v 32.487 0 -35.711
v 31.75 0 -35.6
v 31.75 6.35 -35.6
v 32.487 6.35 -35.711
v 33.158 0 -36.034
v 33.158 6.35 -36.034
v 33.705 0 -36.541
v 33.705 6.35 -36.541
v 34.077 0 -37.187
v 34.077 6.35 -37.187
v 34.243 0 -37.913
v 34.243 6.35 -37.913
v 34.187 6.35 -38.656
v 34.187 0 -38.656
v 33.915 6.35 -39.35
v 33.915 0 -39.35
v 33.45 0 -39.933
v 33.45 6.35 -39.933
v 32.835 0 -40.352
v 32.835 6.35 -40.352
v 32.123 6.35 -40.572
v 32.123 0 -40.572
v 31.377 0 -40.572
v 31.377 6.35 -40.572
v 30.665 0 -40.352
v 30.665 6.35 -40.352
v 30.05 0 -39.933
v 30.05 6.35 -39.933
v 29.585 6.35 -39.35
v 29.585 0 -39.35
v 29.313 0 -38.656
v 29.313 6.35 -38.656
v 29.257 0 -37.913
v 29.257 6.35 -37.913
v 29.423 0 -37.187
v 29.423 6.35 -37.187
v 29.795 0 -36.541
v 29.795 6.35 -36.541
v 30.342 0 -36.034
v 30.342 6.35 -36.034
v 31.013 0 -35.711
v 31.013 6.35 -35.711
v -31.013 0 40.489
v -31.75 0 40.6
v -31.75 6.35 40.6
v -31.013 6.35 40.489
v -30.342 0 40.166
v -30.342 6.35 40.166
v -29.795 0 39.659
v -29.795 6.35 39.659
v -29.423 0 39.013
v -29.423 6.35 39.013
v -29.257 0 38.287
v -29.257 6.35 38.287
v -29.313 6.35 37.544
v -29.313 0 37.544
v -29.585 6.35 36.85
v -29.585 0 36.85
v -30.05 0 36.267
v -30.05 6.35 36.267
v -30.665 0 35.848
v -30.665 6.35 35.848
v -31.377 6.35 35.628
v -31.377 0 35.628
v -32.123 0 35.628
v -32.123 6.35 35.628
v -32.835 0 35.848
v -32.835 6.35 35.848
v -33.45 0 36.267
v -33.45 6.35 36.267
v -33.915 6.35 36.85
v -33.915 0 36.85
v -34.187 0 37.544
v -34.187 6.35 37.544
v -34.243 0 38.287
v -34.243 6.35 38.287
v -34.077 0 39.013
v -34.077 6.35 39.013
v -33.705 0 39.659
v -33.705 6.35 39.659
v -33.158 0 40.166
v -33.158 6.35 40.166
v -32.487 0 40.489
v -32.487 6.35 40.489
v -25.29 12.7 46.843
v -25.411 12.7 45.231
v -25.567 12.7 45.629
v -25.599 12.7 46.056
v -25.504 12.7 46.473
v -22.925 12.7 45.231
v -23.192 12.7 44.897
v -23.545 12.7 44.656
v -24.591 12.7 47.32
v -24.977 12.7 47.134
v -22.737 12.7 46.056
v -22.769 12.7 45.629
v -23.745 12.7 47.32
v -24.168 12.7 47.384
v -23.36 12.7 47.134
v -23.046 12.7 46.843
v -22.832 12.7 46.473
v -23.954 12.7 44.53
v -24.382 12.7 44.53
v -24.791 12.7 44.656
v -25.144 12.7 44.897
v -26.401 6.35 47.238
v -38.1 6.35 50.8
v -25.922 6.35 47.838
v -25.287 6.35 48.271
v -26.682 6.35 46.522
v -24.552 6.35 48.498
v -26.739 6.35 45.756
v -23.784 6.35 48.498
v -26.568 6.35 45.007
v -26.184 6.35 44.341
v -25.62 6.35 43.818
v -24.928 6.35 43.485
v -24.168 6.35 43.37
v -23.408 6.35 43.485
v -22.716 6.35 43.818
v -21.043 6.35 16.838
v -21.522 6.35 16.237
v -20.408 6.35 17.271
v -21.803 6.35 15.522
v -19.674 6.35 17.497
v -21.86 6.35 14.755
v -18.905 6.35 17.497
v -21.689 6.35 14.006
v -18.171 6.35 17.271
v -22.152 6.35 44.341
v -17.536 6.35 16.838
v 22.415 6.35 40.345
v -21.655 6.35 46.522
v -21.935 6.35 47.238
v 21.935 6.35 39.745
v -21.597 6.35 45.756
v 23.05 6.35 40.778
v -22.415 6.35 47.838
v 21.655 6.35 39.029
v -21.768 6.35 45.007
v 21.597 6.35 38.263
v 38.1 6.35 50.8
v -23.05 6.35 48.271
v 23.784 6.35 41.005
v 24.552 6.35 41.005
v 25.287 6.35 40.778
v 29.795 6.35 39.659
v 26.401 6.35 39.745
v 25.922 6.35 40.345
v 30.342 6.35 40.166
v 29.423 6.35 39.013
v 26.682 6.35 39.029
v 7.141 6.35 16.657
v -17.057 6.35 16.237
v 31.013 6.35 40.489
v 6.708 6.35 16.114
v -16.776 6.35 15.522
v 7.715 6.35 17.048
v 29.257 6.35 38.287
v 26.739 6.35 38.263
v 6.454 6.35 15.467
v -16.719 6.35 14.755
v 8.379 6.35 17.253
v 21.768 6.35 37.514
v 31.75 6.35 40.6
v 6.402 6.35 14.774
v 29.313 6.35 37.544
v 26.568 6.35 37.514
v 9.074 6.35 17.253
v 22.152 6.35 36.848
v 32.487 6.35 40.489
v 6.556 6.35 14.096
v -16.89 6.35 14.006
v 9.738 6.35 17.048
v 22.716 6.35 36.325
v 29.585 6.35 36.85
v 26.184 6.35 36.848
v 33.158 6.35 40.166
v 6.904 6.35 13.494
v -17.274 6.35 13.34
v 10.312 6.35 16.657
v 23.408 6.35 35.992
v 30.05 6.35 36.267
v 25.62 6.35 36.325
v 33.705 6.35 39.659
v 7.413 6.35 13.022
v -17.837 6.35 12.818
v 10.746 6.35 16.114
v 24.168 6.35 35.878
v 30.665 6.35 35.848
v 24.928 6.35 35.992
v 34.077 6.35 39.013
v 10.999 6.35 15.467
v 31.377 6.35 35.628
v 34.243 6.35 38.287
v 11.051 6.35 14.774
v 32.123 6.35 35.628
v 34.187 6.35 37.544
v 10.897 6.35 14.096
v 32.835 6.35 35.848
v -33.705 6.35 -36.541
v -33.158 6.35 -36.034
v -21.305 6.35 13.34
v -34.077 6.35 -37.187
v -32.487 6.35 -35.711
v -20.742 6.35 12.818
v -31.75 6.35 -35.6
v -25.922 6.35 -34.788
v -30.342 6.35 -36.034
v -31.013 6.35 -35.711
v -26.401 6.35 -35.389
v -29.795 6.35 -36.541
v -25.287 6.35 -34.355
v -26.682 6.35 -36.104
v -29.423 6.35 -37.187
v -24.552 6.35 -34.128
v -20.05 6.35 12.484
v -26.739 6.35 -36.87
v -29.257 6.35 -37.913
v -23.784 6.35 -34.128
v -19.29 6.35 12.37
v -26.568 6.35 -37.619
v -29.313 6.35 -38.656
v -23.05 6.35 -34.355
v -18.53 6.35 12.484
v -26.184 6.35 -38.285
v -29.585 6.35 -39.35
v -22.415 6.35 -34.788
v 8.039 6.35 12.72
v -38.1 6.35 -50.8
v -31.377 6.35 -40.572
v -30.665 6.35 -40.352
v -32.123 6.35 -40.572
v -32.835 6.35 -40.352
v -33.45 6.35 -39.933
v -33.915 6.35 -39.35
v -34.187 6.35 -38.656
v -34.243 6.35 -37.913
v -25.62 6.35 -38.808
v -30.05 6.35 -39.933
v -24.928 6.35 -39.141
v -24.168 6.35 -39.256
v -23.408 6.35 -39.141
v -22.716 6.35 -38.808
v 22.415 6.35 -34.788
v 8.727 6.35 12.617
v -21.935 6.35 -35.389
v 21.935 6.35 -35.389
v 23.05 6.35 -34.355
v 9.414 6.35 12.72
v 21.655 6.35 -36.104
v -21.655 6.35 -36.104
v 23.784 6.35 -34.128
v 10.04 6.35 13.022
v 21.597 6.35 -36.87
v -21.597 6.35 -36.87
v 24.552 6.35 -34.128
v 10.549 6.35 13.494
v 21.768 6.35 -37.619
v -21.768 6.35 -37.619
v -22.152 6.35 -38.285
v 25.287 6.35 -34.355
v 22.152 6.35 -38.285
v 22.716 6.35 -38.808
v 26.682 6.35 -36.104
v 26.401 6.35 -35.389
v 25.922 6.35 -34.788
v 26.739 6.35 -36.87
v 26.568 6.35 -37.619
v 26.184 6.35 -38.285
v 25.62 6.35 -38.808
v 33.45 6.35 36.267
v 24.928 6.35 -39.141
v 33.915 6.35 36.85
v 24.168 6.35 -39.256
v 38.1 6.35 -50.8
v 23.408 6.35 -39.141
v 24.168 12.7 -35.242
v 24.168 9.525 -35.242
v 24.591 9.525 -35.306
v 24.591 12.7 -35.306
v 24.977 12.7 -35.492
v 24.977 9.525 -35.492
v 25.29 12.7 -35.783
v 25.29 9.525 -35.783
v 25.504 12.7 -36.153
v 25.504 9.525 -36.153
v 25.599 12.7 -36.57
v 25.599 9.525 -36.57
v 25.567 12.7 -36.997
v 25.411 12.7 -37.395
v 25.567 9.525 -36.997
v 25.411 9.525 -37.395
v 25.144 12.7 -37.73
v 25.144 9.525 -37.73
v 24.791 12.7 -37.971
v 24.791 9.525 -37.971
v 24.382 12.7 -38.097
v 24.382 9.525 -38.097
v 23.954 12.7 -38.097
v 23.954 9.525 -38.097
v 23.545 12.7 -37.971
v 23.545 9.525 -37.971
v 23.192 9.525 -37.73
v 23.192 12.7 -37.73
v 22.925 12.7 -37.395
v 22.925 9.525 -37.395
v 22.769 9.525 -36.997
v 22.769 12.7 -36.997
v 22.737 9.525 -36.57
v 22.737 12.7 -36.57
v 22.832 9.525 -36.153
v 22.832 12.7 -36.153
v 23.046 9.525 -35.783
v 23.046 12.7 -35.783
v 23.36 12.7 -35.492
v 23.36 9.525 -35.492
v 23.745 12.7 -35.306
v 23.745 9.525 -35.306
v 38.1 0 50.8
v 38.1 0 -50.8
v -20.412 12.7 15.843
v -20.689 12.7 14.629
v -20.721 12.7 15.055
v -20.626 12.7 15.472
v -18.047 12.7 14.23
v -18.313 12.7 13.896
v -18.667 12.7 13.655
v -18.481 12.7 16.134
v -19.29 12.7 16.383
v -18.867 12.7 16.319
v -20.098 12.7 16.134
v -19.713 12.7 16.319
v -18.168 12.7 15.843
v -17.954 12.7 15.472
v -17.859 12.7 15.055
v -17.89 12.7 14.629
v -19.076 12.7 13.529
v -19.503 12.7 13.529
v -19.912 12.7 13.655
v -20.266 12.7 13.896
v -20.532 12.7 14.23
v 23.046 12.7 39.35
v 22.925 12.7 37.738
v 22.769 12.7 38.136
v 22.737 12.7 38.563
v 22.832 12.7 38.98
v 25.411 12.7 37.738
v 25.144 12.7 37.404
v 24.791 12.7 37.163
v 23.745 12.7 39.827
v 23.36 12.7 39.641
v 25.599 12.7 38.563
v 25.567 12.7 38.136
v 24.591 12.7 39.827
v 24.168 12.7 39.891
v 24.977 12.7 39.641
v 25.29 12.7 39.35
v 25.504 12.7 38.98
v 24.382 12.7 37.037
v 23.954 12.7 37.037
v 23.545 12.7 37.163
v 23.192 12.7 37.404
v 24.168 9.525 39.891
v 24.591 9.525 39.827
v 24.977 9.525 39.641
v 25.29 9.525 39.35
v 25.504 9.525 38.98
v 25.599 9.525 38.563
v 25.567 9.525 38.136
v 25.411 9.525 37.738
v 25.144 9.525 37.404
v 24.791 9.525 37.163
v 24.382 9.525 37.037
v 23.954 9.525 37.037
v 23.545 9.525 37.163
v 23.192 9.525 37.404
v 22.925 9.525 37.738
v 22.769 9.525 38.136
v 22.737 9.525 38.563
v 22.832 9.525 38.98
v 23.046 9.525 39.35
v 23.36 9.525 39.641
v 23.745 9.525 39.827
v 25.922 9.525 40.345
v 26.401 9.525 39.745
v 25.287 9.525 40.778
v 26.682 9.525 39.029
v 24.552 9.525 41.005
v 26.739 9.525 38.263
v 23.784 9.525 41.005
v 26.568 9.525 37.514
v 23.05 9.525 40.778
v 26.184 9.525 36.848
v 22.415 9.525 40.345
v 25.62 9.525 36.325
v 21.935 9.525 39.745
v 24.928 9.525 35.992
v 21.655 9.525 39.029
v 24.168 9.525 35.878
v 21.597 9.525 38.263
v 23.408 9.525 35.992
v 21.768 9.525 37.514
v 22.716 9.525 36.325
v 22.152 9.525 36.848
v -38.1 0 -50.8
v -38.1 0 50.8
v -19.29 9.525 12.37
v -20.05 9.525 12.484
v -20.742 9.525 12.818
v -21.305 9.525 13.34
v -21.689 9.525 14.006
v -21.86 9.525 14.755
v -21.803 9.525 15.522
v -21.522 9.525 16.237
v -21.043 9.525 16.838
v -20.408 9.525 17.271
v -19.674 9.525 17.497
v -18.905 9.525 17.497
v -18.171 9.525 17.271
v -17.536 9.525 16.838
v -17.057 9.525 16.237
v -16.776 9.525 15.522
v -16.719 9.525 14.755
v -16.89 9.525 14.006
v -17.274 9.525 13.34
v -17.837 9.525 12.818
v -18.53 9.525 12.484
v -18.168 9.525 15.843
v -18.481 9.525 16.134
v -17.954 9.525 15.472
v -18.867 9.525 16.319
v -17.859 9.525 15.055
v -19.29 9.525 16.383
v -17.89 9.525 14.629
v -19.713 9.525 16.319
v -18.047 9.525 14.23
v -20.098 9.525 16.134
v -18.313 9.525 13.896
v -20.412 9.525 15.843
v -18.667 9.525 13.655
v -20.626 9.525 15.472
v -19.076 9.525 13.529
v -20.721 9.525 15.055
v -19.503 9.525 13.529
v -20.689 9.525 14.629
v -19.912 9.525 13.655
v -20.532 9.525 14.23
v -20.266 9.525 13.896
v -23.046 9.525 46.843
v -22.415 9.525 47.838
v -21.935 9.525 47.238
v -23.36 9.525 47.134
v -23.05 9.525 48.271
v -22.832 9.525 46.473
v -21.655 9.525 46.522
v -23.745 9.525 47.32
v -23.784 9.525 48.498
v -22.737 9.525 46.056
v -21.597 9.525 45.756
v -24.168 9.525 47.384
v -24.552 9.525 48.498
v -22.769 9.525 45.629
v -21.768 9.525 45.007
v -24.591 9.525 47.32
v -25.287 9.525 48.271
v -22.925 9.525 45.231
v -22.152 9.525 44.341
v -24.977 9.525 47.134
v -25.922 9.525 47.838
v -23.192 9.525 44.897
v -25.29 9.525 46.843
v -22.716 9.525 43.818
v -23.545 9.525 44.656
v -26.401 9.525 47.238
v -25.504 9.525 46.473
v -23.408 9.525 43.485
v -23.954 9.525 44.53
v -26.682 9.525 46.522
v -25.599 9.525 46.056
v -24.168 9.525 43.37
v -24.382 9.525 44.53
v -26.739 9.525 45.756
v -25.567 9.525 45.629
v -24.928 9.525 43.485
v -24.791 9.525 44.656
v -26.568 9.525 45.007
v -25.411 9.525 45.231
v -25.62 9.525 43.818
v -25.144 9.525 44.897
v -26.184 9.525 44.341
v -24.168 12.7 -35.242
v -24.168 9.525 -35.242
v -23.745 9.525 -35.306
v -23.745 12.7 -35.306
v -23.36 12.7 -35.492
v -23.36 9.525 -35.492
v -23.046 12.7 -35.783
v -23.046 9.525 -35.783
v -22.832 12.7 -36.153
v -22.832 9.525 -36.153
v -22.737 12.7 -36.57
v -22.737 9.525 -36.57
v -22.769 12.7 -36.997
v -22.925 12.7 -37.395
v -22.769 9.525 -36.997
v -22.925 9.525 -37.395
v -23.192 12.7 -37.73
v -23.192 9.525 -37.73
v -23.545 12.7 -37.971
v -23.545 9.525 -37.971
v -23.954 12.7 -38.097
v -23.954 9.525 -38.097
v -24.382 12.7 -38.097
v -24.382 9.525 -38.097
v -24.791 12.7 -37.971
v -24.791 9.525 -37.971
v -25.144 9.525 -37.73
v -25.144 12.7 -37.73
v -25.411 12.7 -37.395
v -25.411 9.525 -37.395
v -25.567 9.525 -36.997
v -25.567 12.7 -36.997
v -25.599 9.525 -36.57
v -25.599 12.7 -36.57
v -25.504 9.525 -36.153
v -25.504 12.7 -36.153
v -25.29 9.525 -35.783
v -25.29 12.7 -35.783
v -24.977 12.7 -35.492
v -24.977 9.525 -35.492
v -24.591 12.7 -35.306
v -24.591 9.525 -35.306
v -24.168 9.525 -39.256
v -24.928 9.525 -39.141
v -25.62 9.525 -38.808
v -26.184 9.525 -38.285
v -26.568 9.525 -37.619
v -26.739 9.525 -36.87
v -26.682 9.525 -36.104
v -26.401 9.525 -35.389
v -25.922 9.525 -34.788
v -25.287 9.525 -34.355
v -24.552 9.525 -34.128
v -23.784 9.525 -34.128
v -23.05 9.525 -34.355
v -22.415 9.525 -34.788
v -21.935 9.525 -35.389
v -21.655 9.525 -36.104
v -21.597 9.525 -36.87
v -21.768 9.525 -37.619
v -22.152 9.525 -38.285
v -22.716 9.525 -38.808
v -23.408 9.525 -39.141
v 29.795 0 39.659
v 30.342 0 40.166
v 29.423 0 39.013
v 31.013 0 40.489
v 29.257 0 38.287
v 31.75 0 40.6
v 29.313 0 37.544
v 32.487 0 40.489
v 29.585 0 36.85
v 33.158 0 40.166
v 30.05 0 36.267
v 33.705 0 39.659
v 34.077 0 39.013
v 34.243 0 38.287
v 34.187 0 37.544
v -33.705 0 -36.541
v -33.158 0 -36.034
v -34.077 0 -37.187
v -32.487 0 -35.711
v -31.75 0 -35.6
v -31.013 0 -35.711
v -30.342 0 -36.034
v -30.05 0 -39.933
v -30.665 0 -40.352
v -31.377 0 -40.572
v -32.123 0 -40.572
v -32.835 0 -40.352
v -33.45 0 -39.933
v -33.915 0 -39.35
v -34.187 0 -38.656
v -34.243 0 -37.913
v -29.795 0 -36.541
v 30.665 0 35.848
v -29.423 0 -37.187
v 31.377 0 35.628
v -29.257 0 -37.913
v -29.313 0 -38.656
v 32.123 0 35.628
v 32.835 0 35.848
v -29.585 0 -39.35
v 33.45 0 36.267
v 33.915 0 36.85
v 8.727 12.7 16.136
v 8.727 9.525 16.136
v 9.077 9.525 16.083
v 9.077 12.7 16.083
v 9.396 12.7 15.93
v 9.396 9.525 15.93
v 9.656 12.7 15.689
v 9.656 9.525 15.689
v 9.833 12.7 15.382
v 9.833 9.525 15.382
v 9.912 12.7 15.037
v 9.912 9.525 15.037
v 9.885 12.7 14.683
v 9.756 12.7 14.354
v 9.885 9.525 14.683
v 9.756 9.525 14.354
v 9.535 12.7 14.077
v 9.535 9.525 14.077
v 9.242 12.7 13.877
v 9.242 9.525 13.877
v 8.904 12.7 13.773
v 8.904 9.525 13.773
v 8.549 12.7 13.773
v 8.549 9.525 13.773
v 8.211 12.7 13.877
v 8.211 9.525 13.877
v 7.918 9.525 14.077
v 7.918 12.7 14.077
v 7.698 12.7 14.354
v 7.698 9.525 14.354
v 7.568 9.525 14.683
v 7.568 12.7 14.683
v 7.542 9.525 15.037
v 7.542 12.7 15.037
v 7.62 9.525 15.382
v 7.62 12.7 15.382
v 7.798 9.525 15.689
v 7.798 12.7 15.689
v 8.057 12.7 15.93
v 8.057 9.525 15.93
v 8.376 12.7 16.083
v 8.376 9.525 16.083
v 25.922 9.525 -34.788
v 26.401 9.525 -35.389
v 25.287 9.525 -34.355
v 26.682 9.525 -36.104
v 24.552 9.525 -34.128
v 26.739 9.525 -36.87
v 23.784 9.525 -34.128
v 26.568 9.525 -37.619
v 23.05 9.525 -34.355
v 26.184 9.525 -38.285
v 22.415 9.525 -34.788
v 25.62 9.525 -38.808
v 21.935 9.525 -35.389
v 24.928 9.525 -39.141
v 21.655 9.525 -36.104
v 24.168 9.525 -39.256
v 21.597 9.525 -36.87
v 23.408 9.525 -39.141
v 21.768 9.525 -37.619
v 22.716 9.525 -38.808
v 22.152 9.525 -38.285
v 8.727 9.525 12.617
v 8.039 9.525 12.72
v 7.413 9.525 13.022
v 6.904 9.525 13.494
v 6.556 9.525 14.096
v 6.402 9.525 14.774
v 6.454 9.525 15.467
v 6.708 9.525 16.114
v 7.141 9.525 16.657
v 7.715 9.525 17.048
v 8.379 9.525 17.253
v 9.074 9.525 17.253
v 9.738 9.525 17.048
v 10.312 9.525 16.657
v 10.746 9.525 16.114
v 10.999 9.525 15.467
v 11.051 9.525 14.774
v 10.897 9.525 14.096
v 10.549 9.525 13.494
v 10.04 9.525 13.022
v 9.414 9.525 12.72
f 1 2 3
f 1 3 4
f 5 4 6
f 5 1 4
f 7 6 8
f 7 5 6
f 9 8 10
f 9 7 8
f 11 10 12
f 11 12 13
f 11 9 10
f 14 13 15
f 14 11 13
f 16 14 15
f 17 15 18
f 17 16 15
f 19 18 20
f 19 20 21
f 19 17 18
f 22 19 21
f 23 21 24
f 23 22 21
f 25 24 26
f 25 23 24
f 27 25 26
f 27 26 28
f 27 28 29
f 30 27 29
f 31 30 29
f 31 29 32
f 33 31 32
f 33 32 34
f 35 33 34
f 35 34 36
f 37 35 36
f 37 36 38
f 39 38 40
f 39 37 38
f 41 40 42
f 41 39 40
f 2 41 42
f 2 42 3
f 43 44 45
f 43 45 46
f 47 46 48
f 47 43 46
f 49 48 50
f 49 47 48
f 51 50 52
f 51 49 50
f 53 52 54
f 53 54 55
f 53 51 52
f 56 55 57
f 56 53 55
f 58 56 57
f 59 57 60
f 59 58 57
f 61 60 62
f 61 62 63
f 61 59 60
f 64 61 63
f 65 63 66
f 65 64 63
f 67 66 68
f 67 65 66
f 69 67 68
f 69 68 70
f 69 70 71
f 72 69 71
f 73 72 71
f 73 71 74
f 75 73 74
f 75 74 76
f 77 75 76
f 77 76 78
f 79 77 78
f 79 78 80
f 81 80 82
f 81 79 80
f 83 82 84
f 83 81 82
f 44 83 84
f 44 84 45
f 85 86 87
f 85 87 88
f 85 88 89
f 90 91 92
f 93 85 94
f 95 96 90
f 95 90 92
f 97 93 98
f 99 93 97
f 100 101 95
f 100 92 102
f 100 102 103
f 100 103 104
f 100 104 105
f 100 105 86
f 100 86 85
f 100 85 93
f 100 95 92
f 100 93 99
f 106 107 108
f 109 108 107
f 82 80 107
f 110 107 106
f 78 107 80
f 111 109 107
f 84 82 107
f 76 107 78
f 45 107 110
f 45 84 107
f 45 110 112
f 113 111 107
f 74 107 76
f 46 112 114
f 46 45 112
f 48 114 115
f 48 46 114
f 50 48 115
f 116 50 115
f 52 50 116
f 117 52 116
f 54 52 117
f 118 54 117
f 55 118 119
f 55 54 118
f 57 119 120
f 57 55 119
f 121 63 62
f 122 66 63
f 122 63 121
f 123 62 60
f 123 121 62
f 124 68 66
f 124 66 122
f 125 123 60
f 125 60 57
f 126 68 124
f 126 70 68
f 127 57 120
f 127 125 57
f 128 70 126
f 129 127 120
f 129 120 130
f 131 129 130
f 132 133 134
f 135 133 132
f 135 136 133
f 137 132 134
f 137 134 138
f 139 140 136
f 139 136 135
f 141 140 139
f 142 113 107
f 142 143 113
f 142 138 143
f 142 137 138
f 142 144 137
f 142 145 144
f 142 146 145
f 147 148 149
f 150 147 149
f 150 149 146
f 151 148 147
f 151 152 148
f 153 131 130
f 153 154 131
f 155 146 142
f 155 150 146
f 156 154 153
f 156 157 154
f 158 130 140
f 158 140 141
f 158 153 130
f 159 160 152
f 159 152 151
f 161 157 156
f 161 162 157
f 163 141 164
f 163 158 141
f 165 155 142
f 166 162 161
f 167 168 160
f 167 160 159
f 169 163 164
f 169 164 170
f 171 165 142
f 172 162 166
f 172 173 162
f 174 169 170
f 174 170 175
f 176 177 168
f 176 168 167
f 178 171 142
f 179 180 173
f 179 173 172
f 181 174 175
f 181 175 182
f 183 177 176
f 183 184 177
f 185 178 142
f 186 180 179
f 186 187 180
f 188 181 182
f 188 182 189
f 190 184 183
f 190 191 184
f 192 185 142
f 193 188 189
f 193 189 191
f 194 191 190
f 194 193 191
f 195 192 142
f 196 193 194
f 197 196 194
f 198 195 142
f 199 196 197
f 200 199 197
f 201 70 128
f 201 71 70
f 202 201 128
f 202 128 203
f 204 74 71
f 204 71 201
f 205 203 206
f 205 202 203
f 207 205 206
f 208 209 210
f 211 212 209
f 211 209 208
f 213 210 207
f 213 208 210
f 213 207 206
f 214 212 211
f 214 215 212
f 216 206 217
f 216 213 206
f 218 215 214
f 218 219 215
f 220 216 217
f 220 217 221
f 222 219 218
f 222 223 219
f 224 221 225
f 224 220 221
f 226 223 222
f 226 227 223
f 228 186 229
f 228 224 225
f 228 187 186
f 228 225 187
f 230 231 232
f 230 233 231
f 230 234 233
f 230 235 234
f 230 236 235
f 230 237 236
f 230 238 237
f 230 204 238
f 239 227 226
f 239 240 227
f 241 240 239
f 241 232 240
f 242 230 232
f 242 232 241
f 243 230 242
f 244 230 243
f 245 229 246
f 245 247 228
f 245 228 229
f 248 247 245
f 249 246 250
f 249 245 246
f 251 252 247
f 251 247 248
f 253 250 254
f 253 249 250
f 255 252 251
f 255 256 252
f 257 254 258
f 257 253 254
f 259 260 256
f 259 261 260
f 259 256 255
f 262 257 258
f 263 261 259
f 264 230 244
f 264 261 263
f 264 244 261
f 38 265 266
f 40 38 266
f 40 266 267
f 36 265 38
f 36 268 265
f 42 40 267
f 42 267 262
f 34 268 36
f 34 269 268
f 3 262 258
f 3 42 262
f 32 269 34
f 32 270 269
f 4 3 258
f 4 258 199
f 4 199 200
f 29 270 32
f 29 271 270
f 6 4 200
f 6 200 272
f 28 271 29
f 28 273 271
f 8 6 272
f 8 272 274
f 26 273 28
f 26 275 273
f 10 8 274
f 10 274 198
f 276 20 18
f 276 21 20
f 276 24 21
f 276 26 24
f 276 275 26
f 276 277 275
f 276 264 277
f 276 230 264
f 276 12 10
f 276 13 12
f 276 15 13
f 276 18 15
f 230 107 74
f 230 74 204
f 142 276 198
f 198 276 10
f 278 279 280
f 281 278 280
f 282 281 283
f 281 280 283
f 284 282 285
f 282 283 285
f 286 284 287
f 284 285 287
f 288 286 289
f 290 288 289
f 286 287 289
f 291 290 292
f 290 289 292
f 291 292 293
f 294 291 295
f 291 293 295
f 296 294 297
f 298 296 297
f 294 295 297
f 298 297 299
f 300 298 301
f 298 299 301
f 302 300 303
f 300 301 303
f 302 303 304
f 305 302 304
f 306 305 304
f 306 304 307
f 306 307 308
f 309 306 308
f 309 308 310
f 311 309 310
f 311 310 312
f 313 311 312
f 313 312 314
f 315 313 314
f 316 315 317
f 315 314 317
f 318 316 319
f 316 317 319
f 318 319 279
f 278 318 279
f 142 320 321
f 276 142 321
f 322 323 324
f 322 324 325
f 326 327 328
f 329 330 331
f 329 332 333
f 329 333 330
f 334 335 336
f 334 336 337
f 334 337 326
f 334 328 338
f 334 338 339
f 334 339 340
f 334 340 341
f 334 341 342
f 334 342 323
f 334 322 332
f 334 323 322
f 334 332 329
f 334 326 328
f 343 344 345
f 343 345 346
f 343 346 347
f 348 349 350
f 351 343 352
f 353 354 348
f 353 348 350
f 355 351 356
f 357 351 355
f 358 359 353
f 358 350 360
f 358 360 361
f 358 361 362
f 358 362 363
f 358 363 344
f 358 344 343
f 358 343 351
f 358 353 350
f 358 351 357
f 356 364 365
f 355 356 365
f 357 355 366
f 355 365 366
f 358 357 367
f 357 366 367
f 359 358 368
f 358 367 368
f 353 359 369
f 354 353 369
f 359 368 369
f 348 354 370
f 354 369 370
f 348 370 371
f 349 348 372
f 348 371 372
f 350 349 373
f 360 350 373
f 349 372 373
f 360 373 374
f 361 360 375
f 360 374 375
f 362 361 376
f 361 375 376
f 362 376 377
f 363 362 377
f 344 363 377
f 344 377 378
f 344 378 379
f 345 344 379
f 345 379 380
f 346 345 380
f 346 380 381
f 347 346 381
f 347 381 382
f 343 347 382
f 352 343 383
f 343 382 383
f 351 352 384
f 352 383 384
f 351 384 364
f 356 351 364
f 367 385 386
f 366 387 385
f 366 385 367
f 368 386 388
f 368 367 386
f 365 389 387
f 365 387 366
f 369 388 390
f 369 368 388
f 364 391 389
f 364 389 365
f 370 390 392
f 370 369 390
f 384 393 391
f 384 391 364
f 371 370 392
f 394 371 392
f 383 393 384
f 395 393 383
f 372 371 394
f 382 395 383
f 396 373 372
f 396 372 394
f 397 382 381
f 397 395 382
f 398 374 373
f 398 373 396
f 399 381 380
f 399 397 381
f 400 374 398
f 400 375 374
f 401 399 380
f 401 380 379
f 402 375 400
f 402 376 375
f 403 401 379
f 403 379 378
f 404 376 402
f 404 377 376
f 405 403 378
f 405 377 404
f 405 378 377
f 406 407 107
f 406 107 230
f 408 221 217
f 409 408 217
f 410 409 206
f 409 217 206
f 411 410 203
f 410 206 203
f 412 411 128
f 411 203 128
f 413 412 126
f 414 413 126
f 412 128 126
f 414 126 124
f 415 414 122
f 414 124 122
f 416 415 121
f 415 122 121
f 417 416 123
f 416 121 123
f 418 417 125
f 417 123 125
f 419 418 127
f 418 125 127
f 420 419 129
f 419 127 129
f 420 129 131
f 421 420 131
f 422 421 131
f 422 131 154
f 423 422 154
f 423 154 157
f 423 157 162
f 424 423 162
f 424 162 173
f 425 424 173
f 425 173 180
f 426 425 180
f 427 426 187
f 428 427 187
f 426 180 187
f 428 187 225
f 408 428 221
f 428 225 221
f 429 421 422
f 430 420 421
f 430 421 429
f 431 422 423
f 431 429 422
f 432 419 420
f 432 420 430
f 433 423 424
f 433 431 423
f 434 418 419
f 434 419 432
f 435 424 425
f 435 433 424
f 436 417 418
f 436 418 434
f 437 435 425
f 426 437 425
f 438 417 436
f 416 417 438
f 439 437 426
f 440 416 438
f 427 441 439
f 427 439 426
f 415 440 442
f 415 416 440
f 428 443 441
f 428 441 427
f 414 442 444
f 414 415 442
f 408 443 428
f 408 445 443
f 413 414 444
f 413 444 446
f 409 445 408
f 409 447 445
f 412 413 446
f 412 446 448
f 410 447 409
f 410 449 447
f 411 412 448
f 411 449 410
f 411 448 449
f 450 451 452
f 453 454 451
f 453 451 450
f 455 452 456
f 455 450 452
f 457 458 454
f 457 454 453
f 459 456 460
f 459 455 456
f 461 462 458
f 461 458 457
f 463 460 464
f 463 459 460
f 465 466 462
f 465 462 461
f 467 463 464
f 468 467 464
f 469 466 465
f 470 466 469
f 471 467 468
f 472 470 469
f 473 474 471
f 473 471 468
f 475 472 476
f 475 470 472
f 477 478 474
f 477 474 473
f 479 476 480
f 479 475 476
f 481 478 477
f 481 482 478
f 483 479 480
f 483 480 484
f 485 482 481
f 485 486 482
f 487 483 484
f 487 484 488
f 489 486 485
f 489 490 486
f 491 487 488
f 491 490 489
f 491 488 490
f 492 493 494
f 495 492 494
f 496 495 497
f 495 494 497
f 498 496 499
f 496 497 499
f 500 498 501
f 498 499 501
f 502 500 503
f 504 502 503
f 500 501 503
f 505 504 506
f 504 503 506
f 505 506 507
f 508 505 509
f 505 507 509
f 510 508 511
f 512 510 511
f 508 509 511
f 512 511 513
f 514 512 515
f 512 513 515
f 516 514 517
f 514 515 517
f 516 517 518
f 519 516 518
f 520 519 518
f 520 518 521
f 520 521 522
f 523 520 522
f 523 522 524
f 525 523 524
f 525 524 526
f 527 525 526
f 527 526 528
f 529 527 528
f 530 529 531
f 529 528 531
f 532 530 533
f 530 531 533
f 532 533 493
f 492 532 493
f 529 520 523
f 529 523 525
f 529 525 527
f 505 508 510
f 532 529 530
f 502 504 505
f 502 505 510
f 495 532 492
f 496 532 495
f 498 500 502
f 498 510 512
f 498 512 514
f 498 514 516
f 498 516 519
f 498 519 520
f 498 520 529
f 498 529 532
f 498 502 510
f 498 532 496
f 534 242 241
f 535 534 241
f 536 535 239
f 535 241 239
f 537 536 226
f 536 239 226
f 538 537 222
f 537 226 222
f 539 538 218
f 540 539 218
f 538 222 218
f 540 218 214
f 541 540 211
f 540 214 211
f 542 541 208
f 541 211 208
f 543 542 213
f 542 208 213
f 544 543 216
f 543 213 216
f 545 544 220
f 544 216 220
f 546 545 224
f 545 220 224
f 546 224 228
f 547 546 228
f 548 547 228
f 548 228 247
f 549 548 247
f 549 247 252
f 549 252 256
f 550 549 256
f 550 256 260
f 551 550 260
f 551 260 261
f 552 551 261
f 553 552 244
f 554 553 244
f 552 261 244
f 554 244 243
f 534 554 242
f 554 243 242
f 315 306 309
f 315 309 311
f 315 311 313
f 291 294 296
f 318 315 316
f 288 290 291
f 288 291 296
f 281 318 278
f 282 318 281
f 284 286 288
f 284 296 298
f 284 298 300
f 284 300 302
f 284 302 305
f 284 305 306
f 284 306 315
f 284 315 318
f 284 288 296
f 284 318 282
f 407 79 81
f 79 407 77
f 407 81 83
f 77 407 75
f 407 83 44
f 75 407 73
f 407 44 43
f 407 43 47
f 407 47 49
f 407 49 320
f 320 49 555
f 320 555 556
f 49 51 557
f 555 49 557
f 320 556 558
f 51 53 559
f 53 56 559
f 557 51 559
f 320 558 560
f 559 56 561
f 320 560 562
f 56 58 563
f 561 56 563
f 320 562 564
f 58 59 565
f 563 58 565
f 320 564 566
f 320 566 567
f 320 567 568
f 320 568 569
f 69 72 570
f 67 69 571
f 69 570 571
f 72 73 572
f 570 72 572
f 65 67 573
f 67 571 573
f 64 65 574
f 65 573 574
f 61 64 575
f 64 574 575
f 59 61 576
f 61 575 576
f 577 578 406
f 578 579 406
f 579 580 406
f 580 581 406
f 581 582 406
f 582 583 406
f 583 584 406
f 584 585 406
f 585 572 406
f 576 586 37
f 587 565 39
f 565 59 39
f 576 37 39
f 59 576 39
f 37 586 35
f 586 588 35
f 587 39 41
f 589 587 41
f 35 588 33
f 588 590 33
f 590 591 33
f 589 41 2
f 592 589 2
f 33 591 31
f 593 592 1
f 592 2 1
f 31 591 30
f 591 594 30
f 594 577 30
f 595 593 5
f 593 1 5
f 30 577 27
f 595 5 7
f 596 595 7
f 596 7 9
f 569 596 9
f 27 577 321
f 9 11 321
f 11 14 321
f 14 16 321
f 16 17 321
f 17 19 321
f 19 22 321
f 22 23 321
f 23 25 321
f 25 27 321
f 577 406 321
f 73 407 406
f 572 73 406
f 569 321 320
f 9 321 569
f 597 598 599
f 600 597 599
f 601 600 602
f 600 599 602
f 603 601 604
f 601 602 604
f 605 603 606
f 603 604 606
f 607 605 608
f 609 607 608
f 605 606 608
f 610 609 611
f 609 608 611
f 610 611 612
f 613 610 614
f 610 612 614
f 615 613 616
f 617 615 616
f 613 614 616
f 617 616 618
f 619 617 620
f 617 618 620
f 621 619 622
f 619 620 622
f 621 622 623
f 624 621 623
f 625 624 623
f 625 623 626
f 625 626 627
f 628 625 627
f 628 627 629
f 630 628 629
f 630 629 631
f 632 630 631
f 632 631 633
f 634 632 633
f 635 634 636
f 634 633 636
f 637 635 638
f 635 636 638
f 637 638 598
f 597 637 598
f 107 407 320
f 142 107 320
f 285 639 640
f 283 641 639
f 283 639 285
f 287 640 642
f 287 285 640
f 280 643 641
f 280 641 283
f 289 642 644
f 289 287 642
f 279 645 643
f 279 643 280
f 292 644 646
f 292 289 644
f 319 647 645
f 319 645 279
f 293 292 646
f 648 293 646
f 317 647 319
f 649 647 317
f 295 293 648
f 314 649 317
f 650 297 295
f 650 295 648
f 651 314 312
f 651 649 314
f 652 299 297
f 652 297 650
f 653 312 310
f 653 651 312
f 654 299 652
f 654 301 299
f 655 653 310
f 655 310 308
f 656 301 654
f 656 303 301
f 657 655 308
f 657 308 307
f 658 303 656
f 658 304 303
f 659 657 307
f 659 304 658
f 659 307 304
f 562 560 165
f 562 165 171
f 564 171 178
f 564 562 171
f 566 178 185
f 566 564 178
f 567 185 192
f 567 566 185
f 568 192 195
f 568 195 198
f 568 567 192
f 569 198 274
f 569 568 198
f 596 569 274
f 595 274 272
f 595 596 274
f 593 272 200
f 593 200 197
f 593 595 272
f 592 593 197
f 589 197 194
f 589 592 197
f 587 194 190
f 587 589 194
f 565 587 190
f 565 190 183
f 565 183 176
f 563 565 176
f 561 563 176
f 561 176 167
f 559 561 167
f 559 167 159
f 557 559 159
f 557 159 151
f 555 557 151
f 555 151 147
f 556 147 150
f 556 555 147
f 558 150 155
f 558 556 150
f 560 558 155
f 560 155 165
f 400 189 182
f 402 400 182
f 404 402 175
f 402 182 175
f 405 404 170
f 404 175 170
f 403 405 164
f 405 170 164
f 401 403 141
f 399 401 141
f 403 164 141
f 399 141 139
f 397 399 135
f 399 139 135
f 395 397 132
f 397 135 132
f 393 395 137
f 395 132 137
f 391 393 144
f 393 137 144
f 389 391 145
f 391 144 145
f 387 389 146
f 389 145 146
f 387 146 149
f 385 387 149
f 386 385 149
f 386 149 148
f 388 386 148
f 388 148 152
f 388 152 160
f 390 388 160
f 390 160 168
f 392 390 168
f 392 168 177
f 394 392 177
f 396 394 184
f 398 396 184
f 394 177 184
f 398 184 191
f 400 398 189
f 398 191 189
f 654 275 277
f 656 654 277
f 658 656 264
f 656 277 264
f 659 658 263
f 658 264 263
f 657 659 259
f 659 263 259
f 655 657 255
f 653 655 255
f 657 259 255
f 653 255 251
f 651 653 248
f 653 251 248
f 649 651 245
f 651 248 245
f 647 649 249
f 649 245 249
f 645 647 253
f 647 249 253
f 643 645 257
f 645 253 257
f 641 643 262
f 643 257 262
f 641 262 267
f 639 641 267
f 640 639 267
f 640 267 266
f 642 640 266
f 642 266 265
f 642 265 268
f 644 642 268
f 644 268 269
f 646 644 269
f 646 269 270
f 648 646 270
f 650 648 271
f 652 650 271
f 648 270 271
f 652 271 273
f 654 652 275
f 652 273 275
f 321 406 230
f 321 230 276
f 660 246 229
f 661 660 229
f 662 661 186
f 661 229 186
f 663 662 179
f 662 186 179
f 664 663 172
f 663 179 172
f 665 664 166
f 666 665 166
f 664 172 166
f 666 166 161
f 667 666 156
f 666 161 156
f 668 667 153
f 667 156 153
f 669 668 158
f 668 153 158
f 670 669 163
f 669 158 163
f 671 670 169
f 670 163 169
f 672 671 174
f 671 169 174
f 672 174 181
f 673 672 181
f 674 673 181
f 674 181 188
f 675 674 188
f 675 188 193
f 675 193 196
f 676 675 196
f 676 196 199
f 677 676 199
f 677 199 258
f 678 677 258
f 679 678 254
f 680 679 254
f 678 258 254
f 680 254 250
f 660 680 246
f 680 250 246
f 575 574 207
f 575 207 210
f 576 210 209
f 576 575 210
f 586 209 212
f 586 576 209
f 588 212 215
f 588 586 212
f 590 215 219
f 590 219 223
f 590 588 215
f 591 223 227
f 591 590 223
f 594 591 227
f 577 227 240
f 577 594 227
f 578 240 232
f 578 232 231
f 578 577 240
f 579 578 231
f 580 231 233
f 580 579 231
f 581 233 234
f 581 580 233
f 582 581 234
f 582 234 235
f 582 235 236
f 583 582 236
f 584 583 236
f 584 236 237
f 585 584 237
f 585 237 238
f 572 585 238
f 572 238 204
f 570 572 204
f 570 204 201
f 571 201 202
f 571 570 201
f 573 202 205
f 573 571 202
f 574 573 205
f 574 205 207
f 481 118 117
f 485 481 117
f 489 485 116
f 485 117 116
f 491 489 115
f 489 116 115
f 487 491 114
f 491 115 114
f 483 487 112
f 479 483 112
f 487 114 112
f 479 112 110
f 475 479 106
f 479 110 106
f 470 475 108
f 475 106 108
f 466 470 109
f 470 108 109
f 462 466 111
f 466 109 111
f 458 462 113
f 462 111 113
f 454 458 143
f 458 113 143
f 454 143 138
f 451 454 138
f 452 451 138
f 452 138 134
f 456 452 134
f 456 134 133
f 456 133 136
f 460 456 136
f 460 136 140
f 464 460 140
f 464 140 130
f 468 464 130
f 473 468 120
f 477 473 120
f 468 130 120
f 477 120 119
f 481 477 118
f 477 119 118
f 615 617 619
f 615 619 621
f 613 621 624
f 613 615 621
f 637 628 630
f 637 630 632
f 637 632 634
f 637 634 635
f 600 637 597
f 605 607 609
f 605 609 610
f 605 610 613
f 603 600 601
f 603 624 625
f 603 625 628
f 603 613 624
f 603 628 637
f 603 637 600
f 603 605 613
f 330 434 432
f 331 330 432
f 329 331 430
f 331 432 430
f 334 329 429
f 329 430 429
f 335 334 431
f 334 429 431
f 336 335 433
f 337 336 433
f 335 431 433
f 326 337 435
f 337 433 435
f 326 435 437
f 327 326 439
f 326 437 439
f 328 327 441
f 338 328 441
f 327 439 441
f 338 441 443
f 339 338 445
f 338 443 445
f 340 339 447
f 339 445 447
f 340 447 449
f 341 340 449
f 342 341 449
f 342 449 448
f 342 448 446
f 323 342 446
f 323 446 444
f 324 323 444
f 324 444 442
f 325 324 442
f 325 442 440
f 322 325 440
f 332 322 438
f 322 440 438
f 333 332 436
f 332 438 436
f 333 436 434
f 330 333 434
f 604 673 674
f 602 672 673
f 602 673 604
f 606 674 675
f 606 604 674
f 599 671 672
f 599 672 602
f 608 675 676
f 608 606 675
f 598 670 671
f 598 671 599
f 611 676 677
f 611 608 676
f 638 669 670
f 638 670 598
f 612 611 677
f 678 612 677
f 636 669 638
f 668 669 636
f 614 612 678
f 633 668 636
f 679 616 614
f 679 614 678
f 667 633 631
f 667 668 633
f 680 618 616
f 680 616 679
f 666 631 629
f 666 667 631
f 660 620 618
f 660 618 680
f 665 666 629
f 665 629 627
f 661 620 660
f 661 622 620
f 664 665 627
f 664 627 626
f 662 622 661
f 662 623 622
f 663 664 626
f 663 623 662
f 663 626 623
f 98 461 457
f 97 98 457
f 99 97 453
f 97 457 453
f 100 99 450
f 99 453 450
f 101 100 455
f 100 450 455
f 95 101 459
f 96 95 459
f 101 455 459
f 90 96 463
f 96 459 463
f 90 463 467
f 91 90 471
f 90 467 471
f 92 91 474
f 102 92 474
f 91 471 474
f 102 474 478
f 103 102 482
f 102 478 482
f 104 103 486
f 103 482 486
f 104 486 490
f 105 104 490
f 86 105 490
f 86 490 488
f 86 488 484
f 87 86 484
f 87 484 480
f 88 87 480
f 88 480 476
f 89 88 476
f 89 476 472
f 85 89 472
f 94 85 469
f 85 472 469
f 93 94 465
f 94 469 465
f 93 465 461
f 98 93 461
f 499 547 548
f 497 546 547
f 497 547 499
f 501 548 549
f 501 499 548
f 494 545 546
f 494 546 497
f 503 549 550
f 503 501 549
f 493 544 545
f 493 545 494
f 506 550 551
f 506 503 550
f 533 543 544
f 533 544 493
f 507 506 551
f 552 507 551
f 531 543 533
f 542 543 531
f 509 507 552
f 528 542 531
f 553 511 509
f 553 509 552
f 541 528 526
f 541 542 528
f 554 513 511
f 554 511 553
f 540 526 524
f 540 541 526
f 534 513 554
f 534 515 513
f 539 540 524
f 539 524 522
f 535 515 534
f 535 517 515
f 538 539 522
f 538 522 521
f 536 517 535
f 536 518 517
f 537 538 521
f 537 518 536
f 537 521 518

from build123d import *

# Parameters (mm, degrees)
SKETCH1_W           = 76.2
SKETCH1_H           = 101.6
SKETCH1_R           = 2.5
BOSS_EXTRUDE1_DEPTH = 6.35
SKETCH2_R           = 2.5781
SKETCH2_R_2         = 1.4351
SKETCH2_R_3         = 2.331256363
SKETCH2_R_4         = 1.188256363
BOSS_EXTRUDE2_DEPTH = 3.175
BOSS_EXTRUDE3_START = 3.175
SKETCH2_4_R         = 1.4351
SKETCH2_4_R_2       = 1.188256363
BOSS_EXTRUDE3_DEPTH = 3.175


with BuildPart() as part:
    # Sketch1 → Boss-Extrude1 (new body)
    with BuildSketch(Plane(origin=(0, 0, 0), x_dir=(1, 0, 0), z_dir=(0, 1, 0))):
        Rectangle(SKETCH1_W, SKETCH1_H)
        with Locations(Location((-31.75, 38.1, 0), (0, 0, 270))):
            Circle(SKETCH1_R, mode=Mode.SUBTRACT)
        with Locations(Location((-31.75, -38.1, 0), (0, 0, 270))):
            Circle(SKETCH1_R, mode=Mode.SUBTRACT)
        with Locations(Location((31.75, 38.1, 0), (0, 0, 270))):
            Circle(SKETCH1_R, mode=Mode.SUBTRACT)
        with Locations(Location((31.75, -38.1, 0), (0, 0, 270))):
            Circle(SKETCH1_R, mode=Mode.SUBTRACT)
    extrude(amount=BOSS_EXTRUDE1_DEPTH)

    # Sketch2 → Boss-Extrude2 (add)
    with BuildSketch(Plane(origin=(0, 6.35, 0), x_dir=(1, 0, 0), z_dir=(0, 1, 0))):
        with Locations(Location((-24.1681, 36.6776, 0), (0, 0, 90))):
            Circle(SKETCH2_R)
        with Locations((-24.1681, 36.6776)):
            Circle(SKETCH2_R_2, mode=Mode.SUBTRACT)
        with Locations((-24.1681, 36.6776)):
            Circle(SKETCH2_R_2)
        with Locations(Location((24.1681, 36.6776, 0), (0, 0, 90))):
            Circle(SKETCH2_R)
        with Locations((24.1681, 36.6776)):
            Circle(SKETCH2_R_2, mode=Mode.SUBTRACT)
        with Locations((24.1681, 36.6776)):
            Circle(SKETCH2_R_2)
        with Locations(Location((-19.289607234, -14.9479, 0), (0, 0, 90))):
            Circle(SKETCH2_R)
        with Locations((-19.289607234, -14.9479)):
            Circle(SKETCH2_R_2, mode=Mode.SUBTRACT)
        with Locations((-19.289607234, -14.9479)):
            Circle(SKETCH2_R_2)
        with Locations(Location((8.726592766, -14.9479, 0), (0, 0, 90))):
            Circle(SKETCH2_R_3)
        with Locations((8.726592766, -14.9479)):
            Circle(SKETCH2_R_4, mode=Mode.SUBTRACT)
        with Locations((8.726592766, -14.9479)):
            Circle(SKETCH2_R_4)
        with Locations(Location((-24.1681, -45.9486, 0), (0, 0, 90))):
            Circle(SKETCH2_R)
        with Locations((-24.1681, -45.9486)):
            Circle(SKETCH2_R_2, mode=Mode.SUBTRACT)
        with Locations((-24.1681, -45.9486)):
            Circle(SKETCH2_R_2)
        with Locations(Location((24.1681, -38.4556, 0), (0, 0, 90))):
            Circle(SKETCH2_R)
        with Locations((24.1681, -38.4556)):
            Circle(SKETCH2_R_2, mode=Mode.SUBTRACT)
        with Locations((24.1681, -38.4556)):
            Circle(SKETCH2_R_2)
    extrude(amount=BOSS_EXTRUDE2_DEPTH)

    # Sketch2<4> → Boss-Extrude3 (add)
    with BuildSketch(Plane(origin=(0, 6.35, 0), x_dir=(1, 0, 0), z_dir=(0, 1, 0)).offset(BOSS_EXTRUDE3_START)):
        with Locations(Location((-24.1681, 36.6776, 0), (0, 0, 270))):
            Circle(SKETCH2_4_R)
        with Locations(Location((24.1681, 36.6776, 0), (0, 0, 270))):
            Circle(SKETCH2_4_R)
        with Locations(Location((-19.289607234, -14.9479, 0), (0, 0, 270))):
            Circle(SKETCH2_4_R)
        with Locations(Location((8.726592766, -14.9479, 0), (0, 0, 270))):
            Circle(SKETCH2_4_R_2)
        with Locations(Location((24.1681, -38.4556, 0), (0, 0, 270))):
            Circle(SKETCH2_4_R)
        with Locations(Location((-24.1681, -45.9486, 0), (0, 0, 270))):
            Circle(SKETCH2_4_R)
    extrude(amount=BOSS_EXTRUDE3_DEPTH)


solid = part.part
